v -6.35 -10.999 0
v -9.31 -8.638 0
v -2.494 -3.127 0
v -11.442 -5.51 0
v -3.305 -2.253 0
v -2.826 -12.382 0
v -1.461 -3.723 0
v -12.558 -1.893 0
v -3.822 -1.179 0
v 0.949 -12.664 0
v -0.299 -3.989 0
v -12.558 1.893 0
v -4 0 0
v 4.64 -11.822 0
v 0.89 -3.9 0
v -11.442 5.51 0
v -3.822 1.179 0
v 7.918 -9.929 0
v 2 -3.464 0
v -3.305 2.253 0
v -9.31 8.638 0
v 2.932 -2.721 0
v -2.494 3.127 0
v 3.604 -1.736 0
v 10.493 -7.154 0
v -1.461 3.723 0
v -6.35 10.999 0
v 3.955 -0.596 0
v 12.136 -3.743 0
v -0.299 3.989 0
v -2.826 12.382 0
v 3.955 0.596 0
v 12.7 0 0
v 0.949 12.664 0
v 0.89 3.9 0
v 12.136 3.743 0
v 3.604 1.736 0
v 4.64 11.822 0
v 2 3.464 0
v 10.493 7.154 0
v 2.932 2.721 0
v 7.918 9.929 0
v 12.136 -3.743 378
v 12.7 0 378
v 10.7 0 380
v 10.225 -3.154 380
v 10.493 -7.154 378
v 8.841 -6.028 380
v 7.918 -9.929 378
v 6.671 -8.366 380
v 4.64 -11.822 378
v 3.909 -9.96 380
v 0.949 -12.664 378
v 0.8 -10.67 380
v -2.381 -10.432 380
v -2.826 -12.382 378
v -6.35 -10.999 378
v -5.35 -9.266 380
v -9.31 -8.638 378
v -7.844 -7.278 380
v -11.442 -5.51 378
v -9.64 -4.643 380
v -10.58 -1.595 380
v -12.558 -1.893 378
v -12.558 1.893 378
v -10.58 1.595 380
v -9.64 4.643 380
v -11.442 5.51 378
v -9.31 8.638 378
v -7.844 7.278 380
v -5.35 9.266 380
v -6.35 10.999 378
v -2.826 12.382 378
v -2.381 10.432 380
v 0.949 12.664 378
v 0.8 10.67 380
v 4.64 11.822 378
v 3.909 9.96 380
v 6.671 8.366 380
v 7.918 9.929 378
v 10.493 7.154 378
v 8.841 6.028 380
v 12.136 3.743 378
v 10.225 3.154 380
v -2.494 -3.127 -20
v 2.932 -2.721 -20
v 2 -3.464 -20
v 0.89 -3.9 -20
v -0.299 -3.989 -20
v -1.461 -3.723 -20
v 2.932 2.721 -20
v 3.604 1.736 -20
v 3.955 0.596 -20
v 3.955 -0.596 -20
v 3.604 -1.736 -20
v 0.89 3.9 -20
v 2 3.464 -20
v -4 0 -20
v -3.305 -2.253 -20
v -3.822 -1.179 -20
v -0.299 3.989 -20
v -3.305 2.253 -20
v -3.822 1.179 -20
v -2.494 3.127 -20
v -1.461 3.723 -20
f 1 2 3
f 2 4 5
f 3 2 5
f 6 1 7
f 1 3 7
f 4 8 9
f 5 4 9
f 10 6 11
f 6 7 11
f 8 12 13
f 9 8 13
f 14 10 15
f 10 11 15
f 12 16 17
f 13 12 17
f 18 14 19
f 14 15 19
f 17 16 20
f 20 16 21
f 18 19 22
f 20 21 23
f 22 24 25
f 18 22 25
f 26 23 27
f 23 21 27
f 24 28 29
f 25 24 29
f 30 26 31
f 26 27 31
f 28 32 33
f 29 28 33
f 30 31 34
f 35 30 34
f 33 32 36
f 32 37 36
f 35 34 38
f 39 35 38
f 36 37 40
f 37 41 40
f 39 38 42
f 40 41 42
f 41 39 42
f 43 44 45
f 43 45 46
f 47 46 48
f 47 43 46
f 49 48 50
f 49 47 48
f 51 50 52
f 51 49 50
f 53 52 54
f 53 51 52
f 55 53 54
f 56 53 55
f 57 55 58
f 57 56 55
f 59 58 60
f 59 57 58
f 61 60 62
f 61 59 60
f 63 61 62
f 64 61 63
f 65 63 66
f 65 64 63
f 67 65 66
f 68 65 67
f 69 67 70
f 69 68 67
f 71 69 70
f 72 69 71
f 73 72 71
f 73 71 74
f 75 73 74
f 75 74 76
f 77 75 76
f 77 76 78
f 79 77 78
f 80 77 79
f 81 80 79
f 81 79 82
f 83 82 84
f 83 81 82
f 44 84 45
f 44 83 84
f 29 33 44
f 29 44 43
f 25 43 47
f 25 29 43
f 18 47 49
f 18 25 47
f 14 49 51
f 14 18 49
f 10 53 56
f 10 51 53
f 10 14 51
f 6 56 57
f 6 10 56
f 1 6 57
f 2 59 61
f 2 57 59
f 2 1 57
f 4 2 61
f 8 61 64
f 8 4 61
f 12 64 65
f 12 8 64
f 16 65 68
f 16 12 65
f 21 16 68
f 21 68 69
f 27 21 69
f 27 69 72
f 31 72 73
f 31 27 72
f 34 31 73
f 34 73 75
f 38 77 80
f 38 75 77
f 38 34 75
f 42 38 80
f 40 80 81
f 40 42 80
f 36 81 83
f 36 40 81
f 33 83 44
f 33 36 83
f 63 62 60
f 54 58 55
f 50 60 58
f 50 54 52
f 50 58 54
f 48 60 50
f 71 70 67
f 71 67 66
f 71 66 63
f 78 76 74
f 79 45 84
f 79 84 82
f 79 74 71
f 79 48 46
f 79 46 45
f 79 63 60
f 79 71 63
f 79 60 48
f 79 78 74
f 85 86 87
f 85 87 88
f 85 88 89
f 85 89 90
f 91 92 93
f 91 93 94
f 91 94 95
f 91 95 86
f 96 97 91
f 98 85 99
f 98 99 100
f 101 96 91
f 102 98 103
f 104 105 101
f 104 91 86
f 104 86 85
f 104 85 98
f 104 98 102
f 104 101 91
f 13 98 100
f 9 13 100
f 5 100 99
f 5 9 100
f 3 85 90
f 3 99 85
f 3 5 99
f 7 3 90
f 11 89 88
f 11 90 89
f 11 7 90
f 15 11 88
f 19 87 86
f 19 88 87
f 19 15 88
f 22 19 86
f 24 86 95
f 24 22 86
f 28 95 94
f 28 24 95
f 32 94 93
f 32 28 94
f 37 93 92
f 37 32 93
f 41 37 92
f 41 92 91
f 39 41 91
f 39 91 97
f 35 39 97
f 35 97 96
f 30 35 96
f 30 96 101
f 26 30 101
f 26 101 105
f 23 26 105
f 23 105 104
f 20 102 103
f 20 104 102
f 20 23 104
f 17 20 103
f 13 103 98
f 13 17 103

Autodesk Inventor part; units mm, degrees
ref_plane "YZ Plane" through (0, 0, 0) normal (1, 0, 0) x (0, 1, 0)
ref_plane "XZ Plane" through (0, 0, 0) normal (0, 1, 0) x (-1, 0, 0)
ref_plane "XY Plane" through (0, 0, 0) normal (0, 0, 1) x (1, 0, 0)
sketch "Sketch1" plane through (0, 0, 0) normal (0, 0, 1) x (1, 0, 0)
  circle A0 centre (0, 0) radius 12.7
  dimension "d0" = 25.4
extrude "Extrusion1" add sketch "Sketch1" along normal blind 380
sketch "Sketch2" plane through (0, 0, 0) normal (0, 0, -1) x (-1, 0, 0)
  circle A0 centre (0, 0) radius 12.7 construction
  circle A1 centre (0, 0) radius 4
  dimension "d3" = 8
extrude "Extrusion2" add sketch "Sketch2" along normal blind 20
thread "Thread1" size "M8x1.25" class "6g" standard "ANSI Metric M Profile" full length
chamfer "Chamfer1" distance 2 angle 45 1 edges at (-12.7, 0, 380)
properties part number "22-130 RAIL" material "Aluminum-6061"
